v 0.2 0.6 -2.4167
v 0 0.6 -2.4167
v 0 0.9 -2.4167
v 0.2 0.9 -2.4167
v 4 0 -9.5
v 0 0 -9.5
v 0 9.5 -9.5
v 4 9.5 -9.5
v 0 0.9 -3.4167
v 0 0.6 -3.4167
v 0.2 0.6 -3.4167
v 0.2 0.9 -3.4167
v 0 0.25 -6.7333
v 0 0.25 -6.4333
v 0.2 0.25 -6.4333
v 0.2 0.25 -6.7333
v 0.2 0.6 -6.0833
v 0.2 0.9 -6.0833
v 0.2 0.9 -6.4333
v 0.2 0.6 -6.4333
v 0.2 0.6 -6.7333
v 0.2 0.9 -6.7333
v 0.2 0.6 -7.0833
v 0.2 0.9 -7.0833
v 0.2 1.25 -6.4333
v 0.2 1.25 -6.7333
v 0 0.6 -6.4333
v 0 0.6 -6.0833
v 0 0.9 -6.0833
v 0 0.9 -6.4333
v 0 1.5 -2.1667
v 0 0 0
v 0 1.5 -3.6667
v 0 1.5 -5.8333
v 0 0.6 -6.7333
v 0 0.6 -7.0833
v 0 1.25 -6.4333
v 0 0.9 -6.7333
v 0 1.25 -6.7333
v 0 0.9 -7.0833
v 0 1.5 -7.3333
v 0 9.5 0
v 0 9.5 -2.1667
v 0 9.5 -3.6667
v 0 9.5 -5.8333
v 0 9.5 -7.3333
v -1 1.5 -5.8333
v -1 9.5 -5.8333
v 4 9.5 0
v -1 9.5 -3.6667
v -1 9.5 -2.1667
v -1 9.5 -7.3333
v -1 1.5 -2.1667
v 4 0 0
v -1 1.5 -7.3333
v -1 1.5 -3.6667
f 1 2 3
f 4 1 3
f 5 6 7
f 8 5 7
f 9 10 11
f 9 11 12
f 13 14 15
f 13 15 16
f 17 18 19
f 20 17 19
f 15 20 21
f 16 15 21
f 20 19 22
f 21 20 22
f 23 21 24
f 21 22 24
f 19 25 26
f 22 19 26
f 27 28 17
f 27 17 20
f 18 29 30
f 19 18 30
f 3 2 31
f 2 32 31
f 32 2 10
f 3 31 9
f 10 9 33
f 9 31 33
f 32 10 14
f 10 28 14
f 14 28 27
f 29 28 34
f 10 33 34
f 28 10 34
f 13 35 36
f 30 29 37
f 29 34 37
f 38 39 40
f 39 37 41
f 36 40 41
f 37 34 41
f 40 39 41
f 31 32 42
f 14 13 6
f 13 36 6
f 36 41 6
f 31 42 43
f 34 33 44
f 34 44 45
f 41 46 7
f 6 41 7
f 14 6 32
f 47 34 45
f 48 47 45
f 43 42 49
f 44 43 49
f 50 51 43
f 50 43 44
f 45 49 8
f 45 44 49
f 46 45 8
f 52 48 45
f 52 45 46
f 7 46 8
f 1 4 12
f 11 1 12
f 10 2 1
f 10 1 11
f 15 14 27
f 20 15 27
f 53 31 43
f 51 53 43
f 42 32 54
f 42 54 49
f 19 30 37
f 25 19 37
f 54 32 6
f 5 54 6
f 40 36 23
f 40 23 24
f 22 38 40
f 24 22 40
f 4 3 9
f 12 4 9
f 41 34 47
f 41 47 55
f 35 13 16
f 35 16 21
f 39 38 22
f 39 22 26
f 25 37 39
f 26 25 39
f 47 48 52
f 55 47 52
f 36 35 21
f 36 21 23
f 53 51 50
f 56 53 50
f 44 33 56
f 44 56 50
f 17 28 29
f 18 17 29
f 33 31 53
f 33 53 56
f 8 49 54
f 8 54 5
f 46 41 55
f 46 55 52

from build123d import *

# Parameters (mm, degrees)
SKETCH_1_W          = 9.5
SKETCH_1_H          = 9.5
EXTRUDE_1_DEPTH     = 4
SKETCH_1_4_W        = 1.5
SKETCH_1_4_H        = 8
EXTRUDE_2_DEPTH     = 1
SKETCH_1_5_W        = 1
SKETCH_1_5_H        = 0.3
SKETCH_1_5_W_2      = 0.3
SKETCH_1_5_H_2      = 1
CUT_EXTRUDE_1_DEPTH = 0.2


with BuildPart() as part:
    # 草图1 → 凸台-拉伸1 (new body)
    with BuildSketch(Plane(origin=(0, 0, 0), x_dir=(0, 0, -1), z_dir=(1, 0, 0))):
        with Locations((4.75, 4.75)):
            Rectangle(SKETCH_1_W, SKETCH_1_H)
    extrude(amount=EXTRUDE_1_DEPTH)

    # 草图1<4> → 凸台-拉伸2 (add)
    with BuildSketch(Plane(origin=(0, 0, 0), x_dir=(0, 0, -1), z_dir=(1, 0, 0))):
        with Locations((6.583333333, 5.5)):
            Rectangle(SKETCH_1_4_W, SKETCH_1_4_H)
        with Locations((2.916666667, 5.5)):
            Rectangle(SKETCH_1_4_W, SKETCH_1_4_H)
    extrude(amount=-EXTRUDE_2_DEPTH)

    # 草图1<5> → 切除-拉伸1 (cut)
    with BuildSketch(Plane(origin=(0, 0, 0), x_dir=(0, 0, -1), z_dir=(1, 0, 0))):
        with Locations((6.583333333, 0.75)):
            Rectangle(SKETCH_1_5_W, SKETCH_1_5_H)
        with Locations((6.583333333, 0.75)):
            Rectangle(SKETCH_1_5_W_2, SKETCH_1_5_H_2)
        with Locations((2.916666667, 0.75)):
            Rectangle(SKETCH_1_5_W, SKETCH_1_5_H)
    extrude(amount=CUT_EXTRUDE_1_DEPTH, mode=Mode.SUBTRACT)


solid = part.part
